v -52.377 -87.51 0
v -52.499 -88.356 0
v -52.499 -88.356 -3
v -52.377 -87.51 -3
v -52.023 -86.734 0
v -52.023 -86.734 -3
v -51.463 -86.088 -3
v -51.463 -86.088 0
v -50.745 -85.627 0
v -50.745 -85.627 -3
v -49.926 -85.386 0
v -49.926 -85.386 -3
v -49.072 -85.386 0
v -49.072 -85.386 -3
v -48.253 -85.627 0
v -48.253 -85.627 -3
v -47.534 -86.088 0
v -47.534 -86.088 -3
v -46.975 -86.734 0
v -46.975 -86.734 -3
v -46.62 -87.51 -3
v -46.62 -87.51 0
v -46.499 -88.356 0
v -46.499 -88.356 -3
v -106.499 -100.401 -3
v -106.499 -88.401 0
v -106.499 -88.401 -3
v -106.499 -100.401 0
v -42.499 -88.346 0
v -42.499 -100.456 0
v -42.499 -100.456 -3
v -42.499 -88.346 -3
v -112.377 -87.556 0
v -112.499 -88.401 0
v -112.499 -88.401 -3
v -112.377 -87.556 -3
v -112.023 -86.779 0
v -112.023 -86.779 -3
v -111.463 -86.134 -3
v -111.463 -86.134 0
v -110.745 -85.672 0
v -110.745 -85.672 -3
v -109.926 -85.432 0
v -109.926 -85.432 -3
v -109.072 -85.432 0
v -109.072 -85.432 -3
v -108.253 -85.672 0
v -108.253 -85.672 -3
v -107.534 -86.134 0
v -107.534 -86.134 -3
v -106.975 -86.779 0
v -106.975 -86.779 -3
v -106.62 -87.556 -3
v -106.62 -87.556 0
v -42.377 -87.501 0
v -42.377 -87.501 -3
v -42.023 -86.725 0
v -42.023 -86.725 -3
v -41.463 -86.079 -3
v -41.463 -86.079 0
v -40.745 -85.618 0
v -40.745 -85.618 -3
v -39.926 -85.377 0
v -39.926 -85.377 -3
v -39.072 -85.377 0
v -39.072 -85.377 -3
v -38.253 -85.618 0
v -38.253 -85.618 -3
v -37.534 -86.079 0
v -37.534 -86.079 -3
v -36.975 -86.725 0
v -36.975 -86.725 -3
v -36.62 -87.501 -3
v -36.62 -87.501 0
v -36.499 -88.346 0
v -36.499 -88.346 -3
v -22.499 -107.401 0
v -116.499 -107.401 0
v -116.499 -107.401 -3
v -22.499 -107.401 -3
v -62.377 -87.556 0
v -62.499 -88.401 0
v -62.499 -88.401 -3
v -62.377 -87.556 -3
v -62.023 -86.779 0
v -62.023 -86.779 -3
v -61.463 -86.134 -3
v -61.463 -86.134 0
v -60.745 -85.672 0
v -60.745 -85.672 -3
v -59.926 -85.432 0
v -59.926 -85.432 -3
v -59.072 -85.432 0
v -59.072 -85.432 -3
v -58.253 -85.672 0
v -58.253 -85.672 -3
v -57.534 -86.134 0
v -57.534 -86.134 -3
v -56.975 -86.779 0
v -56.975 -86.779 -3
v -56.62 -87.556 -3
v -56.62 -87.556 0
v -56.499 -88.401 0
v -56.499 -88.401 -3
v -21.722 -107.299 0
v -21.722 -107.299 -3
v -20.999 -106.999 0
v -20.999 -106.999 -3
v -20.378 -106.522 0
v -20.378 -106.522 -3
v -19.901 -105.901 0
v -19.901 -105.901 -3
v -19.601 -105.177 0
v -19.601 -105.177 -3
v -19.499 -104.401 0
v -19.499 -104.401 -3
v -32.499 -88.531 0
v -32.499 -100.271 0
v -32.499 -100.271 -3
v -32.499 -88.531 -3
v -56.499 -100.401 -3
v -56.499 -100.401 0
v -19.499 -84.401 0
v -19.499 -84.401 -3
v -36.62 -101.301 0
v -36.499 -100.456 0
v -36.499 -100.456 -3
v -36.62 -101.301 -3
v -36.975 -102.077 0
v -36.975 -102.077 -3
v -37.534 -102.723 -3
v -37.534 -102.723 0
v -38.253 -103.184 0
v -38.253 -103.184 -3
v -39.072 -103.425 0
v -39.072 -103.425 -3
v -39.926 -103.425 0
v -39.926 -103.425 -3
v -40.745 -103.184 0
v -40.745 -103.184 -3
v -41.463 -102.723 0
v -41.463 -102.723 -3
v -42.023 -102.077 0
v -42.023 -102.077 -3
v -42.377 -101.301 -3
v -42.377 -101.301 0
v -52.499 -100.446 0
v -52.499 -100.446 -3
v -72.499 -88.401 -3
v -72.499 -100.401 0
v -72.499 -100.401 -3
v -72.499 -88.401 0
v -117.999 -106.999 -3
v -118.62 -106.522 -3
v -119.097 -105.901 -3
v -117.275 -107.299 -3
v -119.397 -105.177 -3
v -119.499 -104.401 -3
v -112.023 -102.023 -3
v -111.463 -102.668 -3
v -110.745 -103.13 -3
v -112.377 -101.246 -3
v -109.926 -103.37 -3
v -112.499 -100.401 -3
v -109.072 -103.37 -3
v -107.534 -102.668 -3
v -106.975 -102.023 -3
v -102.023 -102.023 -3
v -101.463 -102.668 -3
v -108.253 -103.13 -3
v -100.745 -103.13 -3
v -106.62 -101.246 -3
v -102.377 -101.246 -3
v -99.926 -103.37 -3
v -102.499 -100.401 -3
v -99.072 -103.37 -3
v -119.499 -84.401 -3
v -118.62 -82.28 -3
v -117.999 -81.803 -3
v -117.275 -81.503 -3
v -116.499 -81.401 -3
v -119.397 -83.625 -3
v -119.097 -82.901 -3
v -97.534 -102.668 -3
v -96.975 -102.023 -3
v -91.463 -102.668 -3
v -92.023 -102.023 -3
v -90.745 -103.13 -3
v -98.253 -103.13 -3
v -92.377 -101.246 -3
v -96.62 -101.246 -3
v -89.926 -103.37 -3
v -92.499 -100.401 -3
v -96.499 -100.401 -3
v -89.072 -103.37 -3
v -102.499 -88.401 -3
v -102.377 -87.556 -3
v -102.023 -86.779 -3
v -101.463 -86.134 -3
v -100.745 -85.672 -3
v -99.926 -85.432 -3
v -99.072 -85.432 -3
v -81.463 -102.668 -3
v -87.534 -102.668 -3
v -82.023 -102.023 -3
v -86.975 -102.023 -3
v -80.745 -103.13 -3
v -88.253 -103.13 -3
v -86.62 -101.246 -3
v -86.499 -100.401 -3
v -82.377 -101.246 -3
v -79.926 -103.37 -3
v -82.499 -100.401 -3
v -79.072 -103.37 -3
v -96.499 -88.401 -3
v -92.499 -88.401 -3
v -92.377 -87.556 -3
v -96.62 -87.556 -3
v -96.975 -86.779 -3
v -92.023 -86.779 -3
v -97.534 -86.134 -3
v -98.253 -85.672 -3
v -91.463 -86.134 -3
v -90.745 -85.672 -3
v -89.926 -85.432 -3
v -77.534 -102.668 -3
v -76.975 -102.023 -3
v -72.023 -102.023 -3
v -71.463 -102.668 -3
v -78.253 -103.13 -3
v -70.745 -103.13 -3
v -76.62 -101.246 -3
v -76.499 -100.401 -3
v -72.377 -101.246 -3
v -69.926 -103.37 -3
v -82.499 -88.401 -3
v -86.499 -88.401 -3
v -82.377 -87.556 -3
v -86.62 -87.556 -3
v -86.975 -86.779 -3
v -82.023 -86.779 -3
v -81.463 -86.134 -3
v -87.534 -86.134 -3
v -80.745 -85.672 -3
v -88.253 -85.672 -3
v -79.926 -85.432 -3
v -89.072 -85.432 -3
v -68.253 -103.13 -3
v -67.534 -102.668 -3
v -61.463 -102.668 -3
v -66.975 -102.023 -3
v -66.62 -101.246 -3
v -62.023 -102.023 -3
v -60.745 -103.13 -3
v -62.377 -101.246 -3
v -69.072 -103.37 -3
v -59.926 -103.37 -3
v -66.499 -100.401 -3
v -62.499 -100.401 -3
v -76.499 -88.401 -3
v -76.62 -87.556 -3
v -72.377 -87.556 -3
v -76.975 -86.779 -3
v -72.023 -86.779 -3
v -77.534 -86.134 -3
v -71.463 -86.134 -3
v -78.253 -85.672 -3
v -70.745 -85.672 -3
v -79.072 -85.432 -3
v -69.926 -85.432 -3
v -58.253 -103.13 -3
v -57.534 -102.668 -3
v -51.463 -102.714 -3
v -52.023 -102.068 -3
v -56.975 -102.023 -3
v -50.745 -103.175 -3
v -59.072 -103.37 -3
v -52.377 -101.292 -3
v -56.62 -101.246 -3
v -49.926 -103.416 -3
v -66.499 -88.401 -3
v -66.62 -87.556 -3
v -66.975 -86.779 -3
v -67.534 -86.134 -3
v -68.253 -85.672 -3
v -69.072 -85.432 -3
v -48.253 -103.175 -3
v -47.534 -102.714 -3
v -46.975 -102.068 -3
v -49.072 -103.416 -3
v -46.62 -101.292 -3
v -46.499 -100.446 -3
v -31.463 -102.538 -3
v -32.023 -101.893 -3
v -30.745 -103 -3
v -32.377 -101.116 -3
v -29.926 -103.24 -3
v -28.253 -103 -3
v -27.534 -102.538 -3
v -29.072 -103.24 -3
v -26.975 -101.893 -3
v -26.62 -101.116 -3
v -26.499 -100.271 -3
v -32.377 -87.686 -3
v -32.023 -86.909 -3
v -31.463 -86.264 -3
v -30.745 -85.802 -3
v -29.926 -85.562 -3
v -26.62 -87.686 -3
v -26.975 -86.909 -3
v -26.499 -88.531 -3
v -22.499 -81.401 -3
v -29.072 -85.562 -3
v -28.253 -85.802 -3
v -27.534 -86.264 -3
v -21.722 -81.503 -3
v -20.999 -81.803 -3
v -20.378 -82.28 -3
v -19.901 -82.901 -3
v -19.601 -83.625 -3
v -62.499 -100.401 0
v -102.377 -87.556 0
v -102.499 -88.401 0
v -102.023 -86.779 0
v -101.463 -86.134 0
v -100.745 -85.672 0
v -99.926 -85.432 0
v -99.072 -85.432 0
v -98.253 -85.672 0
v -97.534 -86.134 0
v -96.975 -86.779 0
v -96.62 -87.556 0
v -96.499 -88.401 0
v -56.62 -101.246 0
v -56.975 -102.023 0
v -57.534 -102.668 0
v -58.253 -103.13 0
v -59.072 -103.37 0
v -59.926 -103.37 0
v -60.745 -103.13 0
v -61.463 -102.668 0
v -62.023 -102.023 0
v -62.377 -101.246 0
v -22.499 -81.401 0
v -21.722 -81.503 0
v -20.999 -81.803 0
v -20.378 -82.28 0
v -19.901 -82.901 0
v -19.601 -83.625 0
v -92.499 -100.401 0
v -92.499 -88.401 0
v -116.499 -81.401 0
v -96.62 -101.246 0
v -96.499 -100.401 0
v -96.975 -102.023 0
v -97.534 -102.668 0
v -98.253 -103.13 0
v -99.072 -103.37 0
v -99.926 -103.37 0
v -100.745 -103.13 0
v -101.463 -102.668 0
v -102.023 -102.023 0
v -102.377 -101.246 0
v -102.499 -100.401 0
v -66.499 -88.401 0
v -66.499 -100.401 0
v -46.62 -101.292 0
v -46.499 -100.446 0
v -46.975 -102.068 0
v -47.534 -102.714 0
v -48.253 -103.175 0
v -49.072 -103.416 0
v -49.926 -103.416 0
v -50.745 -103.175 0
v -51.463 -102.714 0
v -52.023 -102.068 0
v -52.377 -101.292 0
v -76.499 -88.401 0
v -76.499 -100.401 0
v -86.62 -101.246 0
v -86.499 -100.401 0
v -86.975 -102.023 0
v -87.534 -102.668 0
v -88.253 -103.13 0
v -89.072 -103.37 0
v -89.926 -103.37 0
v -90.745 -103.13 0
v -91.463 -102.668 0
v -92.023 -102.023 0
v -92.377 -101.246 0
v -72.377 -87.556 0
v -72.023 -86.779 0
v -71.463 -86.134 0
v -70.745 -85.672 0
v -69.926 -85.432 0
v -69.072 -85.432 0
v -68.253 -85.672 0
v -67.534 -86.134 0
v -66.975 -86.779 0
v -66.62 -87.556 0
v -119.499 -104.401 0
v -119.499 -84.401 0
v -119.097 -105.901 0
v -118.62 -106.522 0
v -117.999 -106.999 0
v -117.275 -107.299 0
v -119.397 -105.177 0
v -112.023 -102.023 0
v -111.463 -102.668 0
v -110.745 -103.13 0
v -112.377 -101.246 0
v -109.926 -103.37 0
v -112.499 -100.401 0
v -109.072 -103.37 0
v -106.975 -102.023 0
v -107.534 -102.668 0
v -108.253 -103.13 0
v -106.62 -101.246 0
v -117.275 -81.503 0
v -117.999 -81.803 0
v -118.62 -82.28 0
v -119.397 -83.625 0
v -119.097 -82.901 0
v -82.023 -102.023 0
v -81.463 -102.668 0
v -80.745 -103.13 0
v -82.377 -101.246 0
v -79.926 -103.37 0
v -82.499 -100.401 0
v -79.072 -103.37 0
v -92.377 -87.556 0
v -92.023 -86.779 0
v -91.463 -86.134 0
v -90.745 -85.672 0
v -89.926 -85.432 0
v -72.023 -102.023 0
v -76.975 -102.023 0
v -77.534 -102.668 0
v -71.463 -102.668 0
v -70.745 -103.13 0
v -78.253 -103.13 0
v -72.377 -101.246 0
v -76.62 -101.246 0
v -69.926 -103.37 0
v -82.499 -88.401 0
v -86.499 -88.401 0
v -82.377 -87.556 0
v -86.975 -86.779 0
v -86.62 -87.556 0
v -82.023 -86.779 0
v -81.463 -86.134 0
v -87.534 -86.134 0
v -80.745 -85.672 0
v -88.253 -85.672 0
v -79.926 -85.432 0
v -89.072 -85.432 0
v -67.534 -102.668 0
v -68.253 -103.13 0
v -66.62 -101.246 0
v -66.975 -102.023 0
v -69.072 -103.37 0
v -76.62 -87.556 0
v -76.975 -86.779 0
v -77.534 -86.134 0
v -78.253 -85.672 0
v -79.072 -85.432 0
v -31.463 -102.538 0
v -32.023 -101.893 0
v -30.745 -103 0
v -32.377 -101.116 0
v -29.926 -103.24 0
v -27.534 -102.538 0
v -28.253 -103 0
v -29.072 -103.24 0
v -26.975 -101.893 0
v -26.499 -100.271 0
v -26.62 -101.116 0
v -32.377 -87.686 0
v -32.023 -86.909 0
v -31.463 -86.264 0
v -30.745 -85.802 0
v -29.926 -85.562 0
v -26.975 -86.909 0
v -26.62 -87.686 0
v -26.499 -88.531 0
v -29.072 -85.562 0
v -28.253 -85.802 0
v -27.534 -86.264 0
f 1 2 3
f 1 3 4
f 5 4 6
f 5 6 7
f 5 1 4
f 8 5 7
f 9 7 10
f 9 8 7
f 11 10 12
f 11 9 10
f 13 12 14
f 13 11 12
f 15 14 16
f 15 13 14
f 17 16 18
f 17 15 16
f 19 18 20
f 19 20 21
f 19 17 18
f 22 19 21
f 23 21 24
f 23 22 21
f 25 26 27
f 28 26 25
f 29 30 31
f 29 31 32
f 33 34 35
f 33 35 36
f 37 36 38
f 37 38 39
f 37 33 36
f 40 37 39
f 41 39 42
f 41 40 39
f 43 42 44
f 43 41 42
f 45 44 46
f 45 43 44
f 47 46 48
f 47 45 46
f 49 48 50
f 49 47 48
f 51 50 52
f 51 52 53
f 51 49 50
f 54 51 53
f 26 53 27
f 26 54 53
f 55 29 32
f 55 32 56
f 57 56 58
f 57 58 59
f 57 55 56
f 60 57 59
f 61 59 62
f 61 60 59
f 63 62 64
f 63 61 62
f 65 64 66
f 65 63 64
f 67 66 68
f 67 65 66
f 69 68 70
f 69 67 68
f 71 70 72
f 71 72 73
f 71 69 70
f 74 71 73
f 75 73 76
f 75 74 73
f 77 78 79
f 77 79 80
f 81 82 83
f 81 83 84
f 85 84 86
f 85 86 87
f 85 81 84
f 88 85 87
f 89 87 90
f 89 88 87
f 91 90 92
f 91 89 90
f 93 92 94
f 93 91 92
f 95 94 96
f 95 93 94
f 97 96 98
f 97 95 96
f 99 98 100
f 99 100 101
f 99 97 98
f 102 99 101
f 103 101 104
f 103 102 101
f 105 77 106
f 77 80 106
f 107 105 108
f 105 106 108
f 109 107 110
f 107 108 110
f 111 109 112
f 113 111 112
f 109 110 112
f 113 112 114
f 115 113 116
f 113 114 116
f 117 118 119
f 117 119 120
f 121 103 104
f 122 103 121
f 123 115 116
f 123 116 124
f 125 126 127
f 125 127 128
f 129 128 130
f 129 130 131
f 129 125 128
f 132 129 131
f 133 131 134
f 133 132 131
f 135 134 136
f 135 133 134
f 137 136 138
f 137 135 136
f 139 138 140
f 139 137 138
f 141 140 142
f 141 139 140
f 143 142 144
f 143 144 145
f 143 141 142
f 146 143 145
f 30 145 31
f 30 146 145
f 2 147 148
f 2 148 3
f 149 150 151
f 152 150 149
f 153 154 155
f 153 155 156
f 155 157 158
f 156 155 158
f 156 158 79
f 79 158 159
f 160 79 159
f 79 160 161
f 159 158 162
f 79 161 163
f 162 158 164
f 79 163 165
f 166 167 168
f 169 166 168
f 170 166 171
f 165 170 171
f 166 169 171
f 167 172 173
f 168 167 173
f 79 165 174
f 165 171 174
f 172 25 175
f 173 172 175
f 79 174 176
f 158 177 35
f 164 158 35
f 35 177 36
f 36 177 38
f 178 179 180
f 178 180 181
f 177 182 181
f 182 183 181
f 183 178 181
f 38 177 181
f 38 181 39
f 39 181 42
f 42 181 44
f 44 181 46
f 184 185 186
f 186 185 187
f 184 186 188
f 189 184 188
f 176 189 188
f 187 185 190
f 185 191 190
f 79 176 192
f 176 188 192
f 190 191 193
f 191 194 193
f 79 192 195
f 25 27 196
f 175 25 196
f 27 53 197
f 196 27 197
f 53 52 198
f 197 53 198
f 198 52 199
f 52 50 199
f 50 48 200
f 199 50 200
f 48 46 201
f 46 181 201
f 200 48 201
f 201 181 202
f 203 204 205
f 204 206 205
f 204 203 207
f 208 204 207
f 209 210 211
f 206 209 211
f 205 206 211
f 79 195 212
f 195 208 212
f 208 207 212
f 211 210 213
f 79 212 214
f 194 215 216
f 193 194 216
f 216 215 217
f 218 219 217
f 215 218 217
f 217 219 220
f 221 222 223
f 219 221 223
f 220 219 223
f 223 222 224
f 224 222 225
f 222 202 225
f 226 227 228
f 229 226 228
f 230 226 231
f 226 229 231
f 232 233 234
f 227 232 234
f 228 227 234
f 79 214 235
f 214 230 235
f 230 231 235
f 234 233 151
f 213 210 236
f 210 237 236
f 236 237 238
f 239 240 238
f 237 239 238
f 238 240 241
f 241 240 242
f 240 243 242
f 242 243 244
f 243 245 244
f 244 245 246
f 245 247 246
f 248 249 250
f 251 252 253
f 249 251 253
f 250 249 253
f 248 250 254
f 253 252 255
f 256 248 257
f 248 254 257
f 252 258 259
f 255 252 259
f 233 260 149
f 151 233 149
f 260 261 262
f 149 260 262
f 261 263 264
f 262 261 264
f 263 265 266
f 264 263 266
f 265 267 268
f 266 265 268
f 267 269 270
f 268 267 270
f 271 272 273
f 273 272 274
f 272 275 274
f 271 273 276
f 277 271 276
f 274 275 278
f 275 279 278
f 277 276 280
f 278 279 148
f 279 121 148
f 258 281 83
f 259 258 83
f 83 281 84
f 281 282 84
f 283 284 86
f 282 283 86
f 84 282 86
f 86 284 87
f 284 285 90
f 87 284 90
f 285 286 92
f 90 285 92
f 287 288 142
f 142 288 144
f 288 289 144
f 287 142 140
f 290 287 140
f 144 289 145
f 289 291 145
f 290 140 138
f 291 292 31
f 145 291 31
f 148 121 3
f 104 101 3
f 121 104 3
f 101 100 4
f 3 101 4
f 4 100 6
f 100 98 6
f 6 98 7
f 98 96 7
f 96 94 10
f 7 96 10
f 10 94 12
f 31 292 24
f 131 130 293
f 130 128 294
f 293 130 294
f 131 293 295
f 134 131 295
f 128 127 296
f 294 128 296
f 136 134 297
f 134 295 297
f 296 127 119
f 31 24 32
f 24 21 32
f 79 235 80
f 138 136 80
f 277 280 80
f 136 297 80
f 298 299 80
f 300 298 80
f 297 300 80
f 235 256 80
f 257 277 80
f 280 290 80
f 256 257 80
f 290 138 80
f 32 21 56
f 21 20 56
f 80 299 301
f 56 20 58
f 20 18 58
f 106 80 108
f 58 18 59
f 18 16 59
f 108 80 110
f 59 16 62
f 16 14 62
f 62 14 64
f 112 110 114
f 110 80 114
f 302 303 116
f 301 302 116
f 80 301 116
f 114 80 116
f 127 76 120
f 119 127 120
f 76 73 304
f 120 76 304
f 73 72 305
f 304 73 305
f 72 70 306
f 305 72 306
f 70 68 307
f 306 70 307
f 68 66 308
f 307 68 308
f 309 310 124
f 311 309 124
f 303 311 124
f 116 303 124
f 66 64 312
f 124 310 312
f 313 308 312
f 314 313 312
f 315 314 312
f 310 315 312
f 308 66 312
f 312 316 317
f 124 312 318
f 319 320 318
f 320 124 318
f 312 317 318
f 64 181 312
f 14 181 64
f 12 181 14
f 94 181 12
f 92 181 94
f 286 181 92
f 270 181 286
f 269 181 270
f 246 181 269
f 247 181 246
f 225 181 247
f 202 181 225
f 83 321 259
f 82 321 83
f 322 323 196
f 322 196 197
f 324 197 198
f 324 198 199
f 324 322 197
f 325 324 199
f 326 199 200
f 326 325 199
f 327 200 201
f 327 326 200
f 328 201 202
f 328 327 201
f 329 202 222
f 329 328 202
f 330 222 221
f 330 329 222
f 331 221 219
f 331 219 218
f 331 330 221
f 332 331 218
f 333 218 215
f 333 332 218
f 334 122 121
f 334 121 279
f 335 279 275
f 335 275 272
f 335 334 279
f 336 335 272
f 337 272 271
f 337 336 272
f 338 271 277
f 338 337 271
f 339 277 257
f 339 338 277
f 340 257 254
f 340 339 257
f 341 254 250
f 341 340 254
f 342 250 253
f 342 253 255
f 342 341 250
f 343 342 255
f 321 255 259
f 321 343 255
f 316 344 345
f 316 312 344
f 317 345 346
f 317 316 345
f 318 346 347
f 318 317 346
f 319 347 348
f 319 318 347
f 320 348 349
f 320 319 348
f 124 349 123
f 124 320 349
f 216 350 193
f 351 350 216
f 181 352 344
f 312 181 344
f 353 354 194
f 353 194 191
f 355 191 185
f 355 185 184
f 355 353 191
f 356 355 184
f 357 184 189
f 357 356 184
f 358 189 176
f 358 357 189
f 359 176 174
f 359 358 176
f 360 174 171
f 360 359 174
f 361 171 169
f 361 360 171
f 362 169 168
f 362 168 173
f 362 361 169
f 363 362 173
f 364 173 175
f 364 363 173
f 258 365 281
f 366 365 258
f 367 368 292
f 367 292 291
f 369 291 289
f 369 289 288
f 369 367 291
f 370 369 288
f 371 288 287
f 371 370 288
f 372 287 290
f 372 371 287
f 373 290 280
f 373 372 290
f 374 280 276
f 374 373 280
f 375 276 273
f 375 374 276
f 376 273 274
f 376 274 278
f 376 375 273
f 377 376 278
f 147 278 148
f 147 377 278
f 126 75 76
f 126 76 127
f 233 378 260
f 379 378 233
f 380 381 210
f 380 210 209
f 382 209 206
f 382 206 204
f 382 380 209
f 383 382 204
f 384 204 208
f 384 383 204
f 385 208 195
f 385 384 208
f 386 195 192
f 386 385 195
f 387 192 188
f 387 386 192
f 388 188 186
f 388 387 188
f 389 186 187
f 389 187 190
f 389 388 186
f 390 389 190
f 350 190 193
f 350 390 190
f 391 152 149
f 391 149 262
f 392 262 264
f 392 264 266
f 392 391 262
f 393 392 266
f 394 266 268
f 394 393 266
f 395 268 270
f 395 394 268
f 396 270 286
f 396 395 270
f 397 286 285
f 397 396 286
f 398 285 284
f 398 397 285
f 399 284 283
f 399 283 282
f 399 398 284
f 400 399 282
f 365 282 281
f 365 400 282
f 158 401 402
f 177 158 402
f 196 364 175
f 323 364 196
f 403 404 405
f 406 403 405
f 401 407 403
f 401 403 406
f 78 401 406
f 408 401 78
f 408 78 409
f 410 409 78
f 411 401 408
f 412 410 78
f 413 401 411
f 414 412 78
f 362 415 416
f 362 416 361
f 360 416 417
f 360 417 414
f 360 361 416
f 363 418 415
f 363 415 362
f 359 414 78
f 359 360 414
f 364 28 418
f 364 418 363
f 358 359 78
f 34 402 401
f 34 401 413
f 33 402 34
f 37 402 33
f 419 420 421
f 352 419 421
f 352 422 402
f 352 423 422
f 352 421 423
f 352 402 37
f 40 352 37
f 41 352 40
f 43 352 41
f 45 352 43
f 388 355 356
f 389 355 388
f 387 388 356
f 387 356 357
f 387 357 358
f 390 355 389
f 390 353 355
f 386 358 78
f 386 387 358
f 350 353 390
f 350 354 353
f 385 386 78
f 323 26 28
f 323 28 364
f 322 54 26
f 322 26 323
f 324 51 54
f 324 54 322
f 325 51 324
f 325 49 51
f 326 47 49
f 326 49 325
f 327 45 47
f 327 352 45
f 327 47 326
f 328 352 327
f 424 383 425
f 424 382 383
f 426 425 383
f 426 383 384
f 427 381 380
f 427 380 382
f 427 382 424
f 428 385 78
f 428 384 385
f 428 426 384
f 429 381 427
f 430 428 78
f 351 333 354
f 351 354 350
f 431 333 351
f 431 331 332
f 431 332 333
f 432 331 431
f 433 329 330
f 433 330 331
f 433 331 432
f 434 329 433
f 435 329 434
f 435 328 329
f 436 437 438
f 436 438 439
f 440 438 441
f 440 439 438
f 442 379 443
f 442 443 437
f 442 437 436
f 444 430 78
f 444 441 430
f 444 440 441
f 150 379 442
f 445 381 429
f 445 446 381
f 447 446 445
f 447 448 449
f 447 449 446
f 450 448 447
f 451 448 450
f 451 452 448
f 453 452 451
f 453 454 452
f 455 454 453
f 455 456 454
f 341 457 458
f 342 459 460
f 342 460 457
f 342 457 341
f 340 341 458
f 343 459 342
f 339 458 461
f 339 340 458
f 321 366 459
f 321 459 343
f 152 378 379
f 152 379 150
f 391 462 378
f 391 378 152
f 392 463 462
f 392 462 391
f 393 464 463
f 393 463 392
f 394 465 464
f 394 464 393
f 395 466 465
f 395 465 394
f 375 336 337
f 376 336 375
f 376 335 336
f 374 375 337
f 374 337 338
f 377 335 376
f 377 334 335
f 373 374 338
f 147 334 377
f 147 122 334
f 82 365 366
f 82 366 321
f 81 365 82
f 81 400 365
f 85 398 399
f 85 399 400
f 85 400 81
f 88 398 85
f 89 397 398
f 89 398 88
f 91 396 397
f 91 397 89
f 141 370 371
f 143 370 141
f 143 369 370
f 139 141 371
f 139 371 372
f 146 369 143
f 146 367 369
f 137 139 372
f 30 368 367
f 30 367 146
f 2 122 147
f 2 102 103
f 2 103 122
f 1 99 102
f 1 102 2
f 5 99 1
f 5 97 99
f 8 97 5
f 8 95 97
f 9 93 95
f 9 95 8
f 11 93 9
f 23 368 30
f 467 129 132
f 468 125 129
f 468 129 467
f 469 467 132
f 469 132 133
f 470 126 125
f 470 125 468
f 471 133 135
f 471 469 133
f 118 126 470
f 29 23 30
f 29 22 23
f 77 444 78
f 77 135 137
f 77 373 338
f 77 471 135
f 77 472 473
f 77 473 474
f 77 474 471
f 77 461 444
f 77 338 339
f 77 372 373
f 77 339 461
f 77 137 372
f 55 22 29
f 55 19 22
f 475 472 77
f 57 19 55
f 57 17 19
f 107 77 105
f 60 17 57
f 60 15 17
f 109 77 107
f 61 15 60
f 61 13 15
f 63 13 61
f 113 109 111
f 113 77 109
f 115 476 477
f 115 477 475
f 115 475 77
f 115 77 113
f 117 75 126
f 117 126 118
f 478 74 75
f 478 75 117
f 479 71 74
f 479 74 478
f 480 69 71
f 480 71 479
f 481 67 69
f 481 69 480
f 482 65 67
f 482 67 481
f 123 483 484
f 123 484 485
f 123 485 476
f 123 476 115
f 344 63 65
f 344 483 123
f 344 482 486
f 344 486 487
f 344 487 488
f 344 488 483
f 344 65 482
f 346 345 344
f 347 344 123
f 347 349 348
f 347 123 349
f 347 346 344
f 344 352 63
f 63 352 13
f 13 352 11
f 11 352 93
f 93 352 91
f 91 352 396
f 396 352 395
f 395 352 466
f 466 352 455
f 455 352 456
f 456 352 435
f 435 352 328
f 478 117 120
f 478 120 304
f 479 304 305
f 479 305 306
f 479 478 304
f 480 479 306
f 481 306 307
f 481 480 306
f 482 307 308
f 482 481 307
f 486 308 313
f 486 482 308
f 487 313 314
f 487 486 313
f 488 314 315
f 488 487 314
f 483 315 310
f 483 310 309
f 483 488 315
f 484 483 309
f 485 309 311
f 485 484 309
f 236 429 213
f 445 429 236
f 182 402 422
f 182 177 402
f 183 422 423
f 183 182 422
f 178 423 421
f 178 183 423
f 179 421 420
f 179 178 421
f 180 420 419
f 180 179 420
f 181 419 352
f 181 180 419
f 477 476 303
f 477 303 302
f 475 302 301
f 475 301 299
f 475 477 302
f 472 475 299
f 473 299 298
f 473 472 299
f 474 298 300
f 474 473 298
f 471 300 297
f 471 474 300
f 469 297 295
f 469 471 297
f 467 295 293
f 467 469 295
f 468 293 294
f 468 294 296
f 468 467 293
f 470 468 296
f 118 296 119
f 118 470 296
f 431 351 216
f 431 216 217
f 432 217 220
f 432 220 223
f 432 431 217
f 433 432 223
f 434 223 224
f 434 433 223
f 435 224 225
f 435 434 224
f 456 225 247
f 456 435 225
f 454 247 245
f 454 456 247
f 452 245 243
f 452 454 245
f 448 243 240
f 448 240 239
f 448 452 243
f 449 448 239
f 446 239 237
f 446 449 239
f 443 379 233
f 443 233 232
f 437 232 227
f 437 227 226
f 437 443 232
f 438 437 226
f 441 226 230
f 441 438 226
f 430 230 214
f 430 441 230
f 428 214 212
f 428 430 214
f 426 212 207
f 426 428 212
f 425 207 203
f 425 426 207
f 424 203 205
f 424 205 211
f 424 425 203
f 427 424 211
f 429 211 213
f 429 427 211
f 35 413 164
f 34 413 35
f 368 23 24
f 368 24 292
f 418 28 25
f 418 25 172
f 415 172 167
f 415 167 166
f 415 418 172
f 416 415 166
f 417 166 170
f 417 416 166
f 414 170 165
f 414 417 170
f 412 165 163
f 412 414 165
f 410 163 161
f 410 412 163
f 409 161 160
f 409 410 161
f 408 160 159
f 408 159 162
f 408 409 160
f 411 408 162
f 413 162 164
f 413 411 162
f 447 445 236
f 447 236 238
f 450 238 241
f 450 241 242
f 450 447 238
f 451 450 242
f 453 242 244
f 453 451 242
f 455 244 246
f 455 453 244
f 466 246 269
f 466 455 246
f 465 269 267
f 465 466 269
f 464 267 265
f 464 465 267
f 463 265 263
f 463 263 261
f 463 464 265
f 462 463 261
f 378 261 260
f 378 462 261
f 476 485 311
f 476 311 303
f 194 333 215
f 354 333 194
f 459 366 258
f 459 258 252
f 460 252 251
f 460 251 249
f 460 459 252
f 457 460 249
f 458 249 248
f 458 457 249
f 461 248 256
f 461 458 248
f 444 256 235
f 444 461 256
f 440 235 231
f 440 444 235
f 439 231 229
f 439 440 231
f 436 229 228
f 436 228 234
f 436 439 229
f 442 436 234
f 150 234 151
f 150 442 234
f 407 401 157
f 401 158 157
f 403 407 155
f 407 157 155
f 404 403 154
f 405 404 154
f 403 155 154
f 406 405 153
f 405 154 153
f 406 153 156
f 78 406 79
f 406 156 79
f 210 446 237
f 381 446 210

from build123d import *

# Parameters (mm, degrees)
SKETCH1_W           = 100
SKETCH1_H           = 26
BOSS_EXTRUDE1_DEPTH = 3
FILLET1_R           = 3


with BuildPart() as part:
    # Sketch1 → Boss-Extrude1 (new body)
    with BuildSketch(Plane.XY):
        with Locations((-69.498894811, -94.401018189)):
            Rectangle(SKETCH1_W, SKETCH1_H)
        with BuildLine():
            Line((-66.498894811, -88.401018189), (-66.498894811, -100.401018189))
            ThreePointArc((-66.498894811, -100.401018189), (-69.498894811, -103.401018189), (-72.498894811, -100.401018189))
            Line((-72.498894811, -100.401018189), (-72.498894811, -88.401018189))
            ThreePointArc((-72.498894811, -88.401018189), (-69.498894811, -85.401018189), (-66.498894811, -88.401018189))
        make_face(mode=Mode.SUBTRACT)
        with BuildLine():
            Line((-106.498894811, -88.401018189), (-106.498894811, -100.401018189))
            ThreePointArc((-106.498894811, -100.401018189), (-109.498894811, -103.401018189), (-112.498894811, -100.401018189))
            Line((-112.498894811, -100.401018189), (-112.498894811, -88.401018189))
            ThreePointArc((-112.498894811, -88.401018189), (-109.498894811, -85.401018189), (-106.498894811, -88.401018189))
        make_face(mode=Mode.SUBTRACT)
        with BuildLine():
            Line((-96.498894811, -88.401018189), (-96.498894811, -100.401018189))
            ThreePointArc((-96.498894811, -100.401018189), (-99.498894811, -103.401018189), (-102.498894811, -100.401018189))
            Line((-102.498894811, -100.401018189), (-102.498894811, -88.401018189))
            ThreePointArc((-102.498894811, -88.401018189), (-99.498894811, -85.401018189), (-96.498894811, -88.401018189))
        make_face(mode=Mode.SUBTRACT)
        with BuildLine():
            Line((-86.498894811, -88.401018189), (-86.498894811, -100.401018189))
            ThreePointArc((-86.498894811, -100.401018189), (-89.498894811, -103.401018189), (-92.498894811, -100.401018189))
            Line((-92.498894811, -100.401018189), (-92.498894811, -88.401018189))
            ThreePointArc((-92.498894811, -88.401018189), (-89.498894811, -85.401018189), (-86.498894811, -88.401018189))
        make_face(mode=Mode.SUBTRACT)
        with BuildLine():
            Line((-76.498894811, -88.401018189), (-76.498894811, -100.401018189))
            ThreePointArc((-76.498894811, -100.401018189), (-79.498894811, -103.401018189), (-82.498894811, -100.401018189))
            Line((-82.498894811, -100.401018189), (-82.498894811, -88.401018189))
            ThreePointArc((-82.498894811, -88.401018189), (-79.498894811, -85.401018189), (-76.498894811, -88.401018189))
        make_face(mode=Mode.SUBTRACT)
        with BuildLine():
            Line((-56.498894811, -88.401018189), (-56.498894811, -100.401018189))
            ThreePointArc((-56.498894811, -100.401018189), (-59.498894811, -103.401018189), (-62.498894811, -100.401018189))
            Line((-62.498894811, -100.401018189), (-62.498894811, -88.401018189))
            ThreePointArc((-62.498894811, -88.401018189), (-59.498894811, -85.401018189), (-56.498894811, -88.401018189))
        make_face(mode=Mode.SUBTRACT)
        with BuildLine():
            Line((-46.498894811, -88.355569142), (-46.498894811, -100.446467236))
            ThreePointArc((-46.498894811, -100.446467236), (-49.498894811, -103.446467236), (-52.498894811, -100.446467236))
            Line((-52.498894811, -100.446467236), (-52.498894811, -88.355569142))
            ThreePointArc((-52.498894811, -88.355569142), (-49.498894811, -85.355569142), (-46.498894811, -88.355569142))
        make_face(mode=Mode.SUBTRACT)
        with BuildLine():
            Line((-36.498894811, -88.346498653), (-36.498894811, -100.455537725))
            ThreePointArc((-36.498894811, -100.455537725), (-39.498894811, -103.455537725), (-42.498894811, -100.455537725))
            Line((-42.498894811, -100.455537725), (-42.498894811, -88.346498653))
            ThreePointArc((-42.498894811, -88.346498653), (-39.498894811, -85.346498653), (-36.498894811, -88.346498653))
        make_face(mode=Mode.SUBTRACT)
        with BuildLine():
            Line((-26.498894811, -88.531064652), (-26.498894811, -100.270971726))
            ThreePointArc((-26.498894811, -100.270971726), (-29.498894811, -103.270971726), (-32.498894811, -100.270971726))
            Line((-32.498894811, -100.270971726), (-32.498894811, -88.531064652))
            ThreePointArc((-32.498894811, -88.531064652), (-29.498894811, -85.531064652), (-26.498894811, -88.531064652))
        make_face(mode=Mode.SUBTRACT)
    extrude(amount=-BOSS_EXTRUDE1_DEPTH)

    # Fillet1
    fillet1_edges = [part.edges().sort_by_distance(p)[0] for p in [
        (-119.498894811, -81.401018189, -1.5),
        (-19.498894811, -81.401018189, -1.5),
        (-19.498894811, -107.401018189, -1.5),
        (-119.498894811, -107.401018189, -1.5),
    ]]
    fillet(fillet1_edges, radius=FILLET1_R)


solid = part.part
